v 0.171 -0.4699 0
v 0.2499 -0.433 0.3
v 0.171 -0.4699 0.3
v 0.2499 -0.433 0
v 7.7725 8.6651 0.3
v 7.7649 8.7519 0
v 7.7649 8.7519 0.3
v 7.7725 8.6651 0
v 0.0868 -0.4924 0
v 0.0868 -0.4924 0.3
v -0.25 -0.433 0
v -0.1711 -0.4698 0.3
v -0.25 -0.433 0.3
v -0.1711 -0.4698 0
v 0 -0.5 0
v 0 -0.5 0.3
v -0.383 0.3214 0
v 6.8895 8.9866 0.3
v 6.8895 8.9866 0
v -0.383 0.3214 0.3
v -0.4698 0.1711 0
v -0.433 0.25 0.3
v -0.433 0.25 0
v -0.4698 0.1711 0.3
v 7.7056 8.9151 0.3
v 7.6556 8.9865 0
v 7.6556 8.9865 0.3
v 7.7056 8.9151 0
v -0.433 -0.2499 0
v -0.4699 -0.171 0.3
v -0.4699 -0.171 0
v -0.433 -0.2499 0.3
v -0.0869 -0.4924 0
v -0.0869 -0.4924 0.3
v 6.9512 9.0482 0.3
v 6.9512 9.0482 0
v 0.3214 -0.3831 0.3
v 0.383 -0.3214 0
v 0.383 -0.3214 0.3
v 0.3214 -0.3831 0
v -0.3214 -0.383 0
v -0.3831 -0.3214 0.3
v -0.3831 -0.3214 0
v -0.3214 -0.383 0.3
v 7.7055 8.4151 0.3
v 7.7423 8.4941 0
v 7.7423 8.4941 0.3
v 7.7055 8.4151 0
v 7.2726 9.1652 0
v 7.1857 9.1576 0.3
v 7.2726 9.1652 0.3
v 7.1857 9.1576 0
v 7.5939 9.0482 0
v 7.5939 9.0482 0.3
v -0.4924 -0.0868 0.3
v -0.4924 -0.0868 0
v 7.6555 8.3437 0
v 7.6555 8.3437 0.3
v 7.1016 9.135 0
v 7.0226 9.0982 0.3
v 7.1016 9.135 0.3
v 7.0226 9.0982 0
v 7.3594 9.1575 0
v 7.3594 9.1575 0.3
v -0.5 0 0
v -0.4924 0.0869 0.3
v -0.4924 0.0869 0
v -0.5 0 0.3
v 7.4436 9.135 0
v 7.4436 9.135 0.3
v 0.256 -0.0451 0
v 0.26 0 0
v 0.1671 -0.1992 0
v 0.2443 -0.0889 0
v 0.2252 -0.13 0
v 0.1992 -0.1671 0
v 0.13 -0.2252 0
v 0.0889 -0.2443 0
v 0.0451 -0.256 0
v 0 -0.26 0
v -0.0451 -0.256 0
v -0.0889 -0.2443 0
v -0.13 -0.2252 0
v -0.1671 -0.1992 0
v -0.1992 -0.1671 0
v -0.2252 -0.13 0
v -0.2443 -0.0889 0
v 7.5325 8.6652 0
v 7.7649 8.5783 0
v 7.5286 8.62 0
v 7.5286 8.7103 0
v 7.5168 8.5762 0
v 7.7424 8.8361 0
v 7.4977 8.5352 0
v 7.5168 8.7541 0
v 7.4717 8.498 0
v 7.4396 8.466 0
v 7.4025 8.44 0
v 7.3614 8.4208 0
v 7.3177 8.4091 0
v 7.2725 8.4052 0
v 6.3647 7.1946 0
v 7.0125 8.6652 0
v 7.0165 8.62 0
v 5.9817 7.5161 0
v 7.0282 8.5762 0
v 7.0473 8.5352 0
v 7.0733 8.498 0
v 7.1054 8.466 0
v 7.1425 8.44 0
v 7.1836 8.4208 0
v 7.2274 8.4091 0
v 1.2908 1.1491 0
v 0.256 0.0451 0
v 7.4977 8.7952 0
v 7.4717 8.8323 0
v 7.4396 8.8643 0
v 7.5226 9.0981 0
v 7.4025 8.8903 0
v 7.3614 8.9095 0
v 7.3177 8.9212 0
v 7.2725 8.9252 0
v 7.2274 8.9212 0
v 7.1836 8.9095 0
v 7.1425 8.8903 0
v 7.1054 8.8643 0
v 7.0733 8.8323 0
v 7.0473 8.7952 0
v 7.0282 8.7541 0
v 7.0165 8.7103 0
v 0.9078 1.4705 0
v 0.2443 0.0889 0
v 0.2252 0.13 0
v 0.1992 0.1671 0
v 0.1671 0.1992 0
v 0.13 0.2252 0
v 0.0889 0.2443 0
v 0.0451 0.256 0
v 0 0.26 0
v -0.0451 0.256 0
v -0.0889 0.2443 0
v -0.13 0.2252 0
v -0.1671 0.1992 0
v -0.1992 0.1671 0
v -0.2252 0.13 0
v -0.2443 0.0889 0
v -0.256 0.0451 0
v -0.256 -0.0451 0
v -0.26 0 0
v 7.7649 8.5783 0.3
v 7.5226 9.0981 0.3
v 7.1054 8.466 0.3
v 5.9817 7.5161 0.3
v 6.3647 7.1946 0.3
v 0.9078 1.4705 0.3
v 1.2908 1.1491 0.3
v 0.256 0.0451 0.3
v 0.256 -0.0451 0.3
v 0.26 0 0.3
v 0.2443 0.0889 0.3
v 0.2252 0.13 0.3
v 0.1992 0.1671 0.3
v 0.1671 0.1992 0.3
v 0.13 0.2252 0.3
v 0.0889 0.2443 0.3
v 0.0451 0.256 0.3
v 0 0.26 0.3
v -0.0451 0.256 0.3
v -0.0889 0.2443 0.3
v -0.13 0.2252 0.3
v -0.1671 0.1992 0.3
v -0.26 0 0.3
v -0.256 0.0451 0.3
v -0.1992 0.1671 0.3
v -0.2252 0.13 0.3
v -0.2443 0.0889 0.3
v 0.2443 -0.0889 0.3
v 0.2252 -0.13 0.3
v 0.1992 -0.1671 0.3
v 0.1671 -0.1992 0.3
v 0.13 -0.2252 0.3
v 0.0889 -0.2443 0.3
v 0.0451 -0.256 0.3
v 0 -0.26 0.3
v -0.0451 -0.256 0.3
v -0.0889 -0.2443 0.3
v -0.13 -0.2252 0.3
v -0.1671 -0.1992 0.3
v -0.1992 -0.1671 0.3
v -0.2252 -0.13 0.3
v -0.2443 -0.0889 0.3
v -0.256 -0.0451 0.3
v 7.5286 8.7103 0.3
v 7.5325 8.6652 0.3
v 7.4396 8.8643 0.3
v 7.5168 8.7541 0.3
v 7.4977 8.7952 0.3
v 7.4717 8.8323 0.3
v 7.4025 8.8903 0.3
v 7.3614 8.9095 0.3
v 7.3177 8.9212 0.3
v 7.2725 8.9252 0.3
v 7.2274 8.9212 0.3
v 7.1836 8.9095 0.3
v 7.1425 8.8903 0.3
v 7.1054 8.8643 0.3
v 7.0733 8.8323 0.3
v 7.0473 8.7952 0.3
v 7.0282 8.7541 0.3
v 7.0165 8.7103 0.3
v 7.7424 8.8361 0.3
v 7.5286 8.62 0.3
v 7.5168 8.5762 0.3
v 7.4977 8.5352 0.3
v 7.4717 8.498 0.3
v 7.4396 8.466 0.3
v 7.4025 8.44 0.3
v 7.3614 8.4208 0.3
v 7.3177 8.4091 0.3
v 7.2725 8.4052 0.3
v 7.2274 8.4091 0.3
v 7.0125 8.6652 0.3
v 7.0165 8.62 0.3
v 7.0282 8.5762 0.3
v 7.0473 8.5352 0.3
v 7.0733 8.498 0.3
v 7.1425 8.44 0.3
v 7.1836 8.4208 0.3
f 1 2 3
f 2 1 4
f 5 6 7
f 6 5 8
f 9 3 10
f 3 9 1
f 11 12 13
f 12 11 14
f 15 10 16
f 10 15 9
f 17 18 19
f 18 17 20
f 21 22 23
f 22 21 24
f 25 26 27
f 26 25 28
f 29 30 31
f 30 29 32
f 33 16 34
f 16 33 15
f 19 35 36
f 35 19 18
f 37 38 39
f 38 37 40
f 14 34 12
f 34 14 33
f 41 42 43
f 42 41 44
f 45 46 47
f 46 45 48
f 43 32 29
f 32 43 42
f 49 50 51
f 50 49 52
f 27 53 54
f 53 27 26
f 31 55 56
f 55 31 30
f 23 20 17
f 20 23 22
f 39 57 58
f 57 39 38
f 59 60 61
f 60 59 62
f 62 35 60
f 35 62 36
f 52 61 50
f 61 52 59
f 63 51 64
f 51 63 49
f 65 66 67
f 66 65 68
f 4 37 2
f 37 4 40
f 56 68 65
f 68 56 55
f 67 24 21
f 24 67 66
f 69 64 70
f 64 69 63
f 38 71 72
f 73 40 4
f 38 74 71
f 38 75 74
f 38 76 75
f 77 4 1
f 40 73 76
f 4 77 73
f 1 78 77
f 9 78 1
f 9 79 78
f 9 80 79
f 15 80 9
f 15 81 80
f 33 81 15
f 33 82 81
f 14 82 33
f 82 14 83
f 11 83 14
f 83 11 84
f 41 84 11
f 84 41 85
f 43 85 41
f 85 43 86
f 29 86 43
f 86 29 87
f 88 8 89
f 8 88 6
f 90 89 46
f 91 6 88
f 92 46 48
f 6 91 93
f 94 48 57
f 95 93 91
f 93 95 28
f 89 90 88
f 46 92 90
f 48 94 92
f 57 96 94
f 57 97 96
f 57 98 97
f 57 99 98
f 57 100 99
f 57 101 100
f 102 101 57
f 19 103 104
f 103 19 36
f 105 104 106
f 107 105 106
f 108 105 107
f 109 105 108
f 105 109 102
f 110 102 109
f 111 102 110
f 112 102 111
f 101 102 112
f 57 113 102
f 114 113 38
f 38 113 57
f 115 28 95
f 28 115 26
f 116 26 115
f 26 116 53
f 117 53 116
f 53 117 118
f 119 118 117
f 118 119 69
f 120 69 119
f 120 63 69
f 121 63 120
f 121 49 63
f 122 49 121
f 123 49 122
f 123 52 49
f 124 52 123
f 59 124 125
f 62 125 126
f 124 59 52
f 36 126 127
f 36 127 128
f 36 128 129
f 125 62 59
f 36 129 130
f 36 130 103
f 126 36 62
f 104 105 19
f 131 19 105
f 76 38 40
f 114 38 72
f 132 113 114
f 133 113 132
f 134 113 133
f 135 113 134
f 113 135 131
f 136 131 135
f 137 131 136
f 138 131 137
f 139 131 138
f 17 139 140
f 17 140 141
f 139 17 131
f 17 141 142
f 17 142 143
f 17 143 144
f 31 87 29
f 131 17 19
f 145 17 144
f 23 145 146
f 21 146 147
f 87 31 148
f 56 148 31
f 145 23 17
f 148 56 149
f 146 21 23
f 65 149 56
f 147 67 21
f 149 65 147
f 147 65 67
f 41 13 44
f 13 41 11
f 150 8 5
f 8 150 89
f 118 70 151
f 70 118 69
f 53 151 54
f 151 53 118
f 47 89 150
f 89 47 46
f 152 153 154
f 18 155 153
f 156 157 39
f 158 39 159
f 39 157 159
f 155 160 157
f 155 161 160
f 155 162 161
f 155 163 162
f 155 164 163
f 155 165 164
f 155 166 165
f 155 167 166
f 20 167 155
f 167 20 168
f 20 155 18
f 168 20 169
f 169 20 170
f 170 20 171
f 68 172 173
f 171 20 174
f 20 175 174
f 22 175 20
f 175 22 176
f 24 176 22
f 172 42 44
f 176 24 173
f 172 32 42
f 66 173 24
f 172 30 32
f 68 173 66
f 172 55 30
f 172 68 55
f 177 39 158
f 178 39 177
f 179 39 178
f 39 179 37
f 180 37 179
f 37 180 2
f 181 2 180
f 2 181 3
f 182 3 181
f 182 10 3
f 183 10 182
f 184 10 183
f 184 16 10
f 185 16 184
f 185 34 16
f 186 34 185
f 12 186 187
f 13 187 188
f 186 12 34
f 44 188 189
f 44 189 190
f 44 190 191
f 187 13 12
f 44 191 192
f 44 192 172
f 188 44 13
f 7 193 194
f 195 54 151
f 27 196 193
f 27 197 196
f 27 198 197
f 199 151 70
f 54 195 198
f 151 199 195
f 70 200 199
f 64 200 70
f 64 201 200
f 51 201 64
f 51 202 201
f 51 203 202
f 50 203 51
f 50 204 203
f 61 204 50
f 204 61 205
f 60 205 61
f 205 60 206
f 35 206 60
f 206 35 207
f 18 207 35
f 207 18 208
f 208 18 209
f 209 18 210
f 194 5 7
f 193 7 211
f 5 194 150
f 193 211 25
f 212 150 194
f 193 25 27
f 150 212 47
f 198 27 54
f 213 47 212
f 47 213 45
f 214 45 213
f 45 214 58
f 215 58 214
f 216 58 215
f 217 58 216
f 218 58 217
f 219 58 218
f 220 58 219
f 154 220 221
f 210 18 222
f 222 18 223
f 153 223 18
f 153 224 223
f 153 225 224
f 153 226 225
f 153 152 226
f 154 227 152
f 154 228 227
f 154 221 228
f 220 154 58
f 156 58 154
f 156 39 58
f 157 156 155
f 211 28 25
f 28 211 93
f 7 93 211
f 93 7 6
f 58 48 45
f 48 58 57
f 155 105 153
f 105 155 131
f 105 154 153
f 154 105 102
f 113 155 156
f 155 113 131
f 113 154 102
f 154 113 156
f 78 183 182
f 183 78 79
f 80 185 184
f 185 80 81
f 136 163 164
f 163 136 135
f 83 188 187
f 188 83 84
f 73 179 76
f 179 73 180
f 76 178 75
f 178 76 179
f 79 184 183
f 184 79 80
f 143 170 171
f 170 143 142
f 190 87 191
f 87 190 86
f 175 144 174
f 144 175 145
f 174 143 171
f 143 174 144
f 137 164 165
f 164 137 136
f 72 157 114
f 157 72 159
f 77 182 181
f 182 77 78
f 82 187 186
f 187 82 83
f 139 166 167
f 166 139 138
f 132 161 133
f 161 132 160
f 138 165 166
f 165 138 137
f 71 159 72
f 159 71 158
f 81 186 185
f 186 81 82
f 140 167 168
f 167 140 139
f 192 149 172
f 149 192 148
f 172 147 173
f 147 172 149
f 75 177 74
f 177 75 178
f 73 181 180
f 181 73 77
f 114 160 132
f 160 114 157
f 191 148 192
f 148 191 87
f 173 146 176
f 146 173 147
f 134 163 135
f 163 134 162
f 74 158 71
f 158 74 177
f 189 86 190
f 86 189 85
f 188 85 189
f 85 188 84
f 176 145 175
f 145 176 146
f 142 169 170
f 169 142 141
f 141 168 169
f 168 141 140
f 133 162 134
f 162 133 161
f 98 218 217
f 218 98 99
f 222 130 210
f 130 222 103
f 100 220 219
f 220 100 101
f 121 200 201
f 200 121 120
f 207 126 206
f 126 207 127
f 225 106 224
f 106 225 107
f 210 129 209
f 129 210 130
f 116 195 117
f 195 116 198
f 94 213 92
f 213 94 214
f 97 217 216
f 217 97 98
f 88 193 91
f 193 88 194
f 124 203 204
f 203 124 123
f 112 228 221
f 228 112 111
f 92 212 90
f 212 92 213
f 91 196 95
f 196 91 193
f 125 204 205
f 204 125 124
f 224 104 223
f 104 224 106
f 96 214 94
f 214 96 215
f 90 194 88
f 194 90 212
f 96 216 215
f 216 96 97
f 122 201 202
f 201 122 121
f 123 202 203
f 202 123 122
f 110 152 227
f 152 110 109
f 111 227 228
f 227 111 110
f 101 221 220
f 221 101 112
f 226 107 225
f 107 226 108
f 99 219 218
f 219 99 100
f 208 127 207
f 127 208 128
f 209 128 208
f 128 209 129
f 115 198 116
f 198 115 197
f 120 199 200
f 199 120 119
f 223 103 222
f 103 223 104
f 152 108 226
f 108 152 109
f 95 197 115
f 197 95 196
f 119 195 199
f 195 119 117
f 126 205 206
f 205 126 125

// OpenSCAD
difference() {
	linear_extrude(height=0.3) {
		polygon( points=[[-0.382988,0.321435], [-0.432986,0.250047], [-0.469828,0.171061], [-0.492395,0.086877], [-0.5,5.37215e-05], [-0.492413,-0.0867712], [-0.469865,-0.17096], [-0.43304,-0.249953], [-0.383057,-0.321353], [-0.321435,-0.382988], [-0.250047,-0.432986], [-0.171061,-0.469828], [-0.086877,-0.492395], [-5.37224e-05,-0.5], [0.0867712,-0.492413], [0.17096,-0.469865], [0.249953,-0.43304], [0.321353,-0.383057], [0.382988,-0.321435], [7.65551,8.34373], [7.70551,8.41512], [7.74235,8.49411], [7.76492,8.57829], [7.77253,8.66511], [7.76494,8.75194], [7.74239,8.83613], [7.70557,8.91512], [7.65558,8.98652], [7.59396,9.04816], [7.52257,9.09815], [7.44359,9.135], [7.3594,9.15756], [7.27258,9.16517], [7.18575,9.15758], [7.10157,9.13503], [7.02257,9.09821], [6.95117,9.04823], [6.88954,8.9866]]);
	}
	translate([0,0,-0.1]) {
		linear_extrude(height=0.5) {
			polygon( points=[[0.907814,1.47054], [1.2908,1.1491], [6.36471,7.19463], [5.98172,7.51607]]);
		}
	}
	translate([0,0,-0.1]) {
		linear_extrude(height=0.5) {
			polygon( points=[[0.26,0], [0.25605,0.0451485], [0.24432,0.0889252], [0.225167,0.13], [0.199172,0.167125], [0.167125,0.199172], [0.13,0.225167], [0.0889252,0.24432], [0.0451485,0.25605], [4.66673e-10,0.26], [-0.0451485,0.25605], [-0.0889252,0.24432], [-0.13,0.225167], [-0.167125,0.199172], [-0.199172,0.167125], [-0.225167,0.13], [-0.24432,0.0889252], [-0.25605,0.0451485], [-0.26,9.33346e-10], [-0.25605,-0.0451485], [-0.24432,-0.0889252], [-0.225167,-0.13], [-0.199172,-0.167125], [-0.167125,-0.199172], [-0.13,-0.225167], [-0.0889252,-0.24432], [-0.0451485,-0.25605], [-1.40002e-09,-0.26], [0.0451485,-0.25605], [0.0889252,-0.24432], [0.13,-0.225167], [0.167125,-0.199172], [0.199172,-0.167125], [0.225167,-0.13], [0.24432,-0.0889252], [0.25605,-0.0451485]]);
		}
	}
	translate([0,0,-0.1]) {
		linear_extrude(height=0.5) {
			polygon( points=[[7.53253,8.66517], [7.52858,8.71032], [7.51685,8.75409], [7.49769,8.79517], [7.4717,8.83229], [7.43965,8.86434], [7.40253,8.89033], [7.36145,8.90949], [7.31767,8.92122], [7.27253,8.92517], [7.22738,8.92122], [7.1836,8.90949], [7.14253,8.89033], [7.1054,8.86434], [7.07335,8.83229], [7.04736,8.79517], [7.02821,8.75409], [7.01648,8.71032], [7.01253,8.66517], [7.01648,8.62002], [7.02821,8.57624], [7.04736,8.53517], [7.07335,8.49804], [7.1054,8.466], [7.14253,8.44], [7.1836,8.42085], [7.22738,8.40912], [7.27253,8.40517], [7.31767,8.40912], [7.36145,8.42085], [7.40253,8.44], [7.43965,8.466], [7.4717,8.49804], [7.49769,8.53517], [7.51685,8.57624], [7.52858,8.62002]]);
		}
	}
}
